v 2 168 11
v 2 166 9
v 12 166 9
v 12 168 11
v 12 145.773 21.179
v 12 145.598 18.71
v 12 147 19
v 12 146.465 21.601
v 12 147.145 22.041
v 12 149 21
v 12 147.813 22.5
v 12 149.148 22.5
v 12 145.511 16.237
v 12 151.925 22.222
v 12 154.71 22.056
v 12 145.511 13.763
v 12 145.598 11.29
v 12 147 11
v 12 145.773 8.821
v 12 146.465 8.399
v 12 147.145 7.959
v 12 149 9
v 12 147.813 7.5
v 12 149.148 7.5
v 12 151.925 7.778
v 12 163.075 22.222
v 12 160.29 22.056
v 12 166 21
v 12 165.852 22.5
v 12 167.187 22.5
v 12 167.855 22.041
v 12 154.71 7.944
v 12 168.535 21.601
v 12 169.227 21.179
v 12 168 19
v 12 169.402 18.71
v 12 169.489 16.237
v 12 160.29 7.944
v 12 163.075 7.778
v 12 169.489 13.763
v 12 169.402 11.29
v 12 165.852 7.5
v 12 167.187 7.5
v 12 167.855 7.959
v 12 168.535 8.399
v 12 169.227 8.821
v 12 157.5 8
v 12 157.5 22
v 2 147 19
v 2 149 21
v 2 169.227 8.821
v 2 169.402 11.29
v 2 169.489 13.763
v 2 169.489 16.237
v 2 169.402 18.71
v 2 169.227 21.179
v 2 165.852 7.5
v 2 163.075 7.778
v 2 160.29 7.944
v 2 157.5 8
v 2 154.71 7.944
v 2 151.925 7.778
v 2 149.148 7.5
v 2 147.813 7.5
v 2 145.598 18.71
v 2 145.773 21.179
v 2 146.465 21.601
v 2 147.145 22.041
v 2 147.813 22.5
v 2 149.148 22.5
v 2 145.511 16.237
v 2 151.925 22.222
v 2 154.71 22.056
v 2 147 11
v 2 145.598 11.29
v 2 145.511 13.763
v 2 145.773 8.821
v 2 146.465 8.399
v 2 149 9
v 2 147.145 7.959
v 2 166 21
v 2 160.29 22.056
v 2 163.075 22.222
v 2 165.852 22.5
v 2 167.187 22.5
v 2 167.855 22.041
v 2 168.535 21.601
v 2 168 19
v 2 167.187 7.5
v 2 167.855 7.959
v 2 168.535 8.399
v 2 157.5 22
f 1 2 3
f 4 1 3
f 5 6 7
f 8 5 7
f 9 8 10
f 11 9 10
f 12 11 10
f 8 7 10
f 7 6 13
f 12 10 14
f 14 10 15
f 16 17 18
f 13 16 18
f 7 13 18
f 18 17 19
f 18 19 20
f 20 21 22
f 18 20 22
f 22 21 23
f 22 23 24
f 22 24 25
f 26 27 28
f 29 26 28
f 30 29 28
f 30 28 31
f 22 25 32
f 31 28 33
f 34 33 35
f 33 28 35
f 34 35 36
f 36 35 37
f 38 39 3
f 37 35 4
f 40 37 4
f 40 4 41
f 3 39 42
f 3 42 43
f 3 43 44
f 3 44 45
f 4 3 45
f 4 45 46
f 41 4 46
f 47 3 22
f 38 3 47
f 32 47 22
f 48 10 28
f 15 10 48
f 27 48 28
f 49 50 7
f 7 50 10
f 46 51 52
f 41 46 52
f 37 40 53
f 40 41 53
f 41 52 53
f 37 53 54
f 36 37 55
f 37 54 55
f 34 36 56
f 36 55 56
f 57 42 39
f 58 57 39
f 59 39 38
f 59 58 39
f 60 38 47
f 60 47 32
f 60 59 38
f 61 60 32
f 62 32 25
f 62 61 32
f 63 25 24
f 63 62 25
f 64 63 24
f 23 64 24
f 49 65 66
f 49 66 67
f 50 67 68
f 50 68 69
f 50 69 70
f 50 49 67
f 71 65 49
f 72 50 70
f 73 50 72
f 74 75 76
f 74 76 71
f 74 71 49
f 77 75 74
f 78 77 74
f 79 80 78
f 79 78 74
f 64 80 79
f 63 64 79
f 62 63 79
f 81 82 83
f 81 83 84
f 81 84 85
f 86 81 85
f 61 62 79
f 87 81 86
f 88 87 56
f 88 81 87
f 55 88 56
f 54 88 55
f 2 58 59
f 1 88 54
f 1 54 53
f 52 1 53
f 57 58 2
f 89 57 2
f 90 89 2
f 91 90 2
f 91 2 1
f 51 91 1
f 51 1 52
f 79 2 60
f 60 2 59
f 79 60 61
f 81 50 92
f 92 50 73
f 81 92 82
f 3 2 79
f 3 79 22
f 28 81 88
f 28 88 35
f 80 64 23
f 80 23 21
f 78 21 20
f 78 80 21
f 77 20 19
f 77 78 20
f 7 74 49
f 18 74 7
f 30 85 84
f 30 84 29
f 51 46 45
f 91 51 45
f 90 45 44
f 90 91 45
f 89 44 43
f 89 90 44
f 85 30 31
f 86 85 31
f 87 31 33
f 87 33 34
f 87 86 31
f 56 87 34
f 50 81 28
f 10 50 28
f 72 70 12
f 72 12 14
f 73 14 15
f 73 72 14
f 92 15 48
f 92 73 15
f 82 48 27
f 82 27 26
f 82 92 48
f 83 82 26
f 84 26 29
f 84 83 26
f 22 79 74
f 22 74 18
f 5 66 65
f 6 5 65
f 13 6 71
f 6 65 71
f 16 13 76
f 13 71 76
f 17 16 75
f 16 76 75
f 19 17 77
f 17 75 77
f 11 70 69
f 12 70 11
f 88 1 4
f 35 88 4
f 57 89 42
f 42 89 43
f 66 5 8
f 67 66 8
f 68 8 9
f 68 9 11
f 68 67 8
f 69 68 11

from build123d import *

# Parameters (mm, degrees)
BOX011_W          = 10
BOX011_H          = 21
BOX011_DEPTH      = 12
CHAMFER001_SIZE   = 2
CYLINDER032_R     = 30
CYLINDER032_DEPTH = 10
CYLINDER031_R     = 30
CYLINDER031_DEPTH = 10
CYLINDER030_R     = 30
CYLINDER030_DEPTH = 10
CYLINDER028_R     = 30
CYLINDER028_DEPTH = 10
CYLINDER029_R     = 70
CYLINDER029_DEPTH = 10
CYLINDER027_R     = 70
CYLINDER027_DEPTH = 10
CYLINDER026_R     = 70
CYLINDER026_DEPTH = 10
CYLINDER025_R     = 70
CYLINDER025_DEPTH = 10
BOX008_W          = 10
BOX008_H          = 24
BOX008_DEPTH      = 15


with BuildPart() as chamfer001:
    # Box011 → Box011 (new body)
    with BuildSketch(Plane(origin=(2, 12, 9), x_dir=(1, 0, 0), z_dir=(0, 0, 1))):
        with Locations((5, 10.5)):
            Rectangle(BOX011_W, BOX011_H)
    extrude(amount=BOX011_DEPTH)

    # Chamfer001
    chamfer001_edges = [chamfer001.edges().sort_by_distance(p)[0] for p in [
        (7, 12, 9),
        (7, 12, 21),
        (7, 33, 9),
        (7, 33, 21),
    ]]
    chamfer(chamfer001_edges, length=CHAMFER001_SIZE)


with BuildPart() as chamfer001_1:
    # Chamfer001 placement: moved
    add(chamfer001.part.moved(Location((0, 135, 0))))


with BuildPart() as cylinder032:
    # Cylinder032 → Cylinder032 (new body)
    with BuildSketch(Plane(origin=(22, -27, 39.5), x_dir=(0, 0, -1), z_dir=(1, 0, 0))):
        Circle(CYLINDER032_R)
    extrude(amount=CYLINDER032_DEPTH)


with BuildPart() as cylinder031:
    # Cylinder031 → Cylinder031 (new body)
    with BuildSketch(Plane(origin=(22, -27, -24.5), x_dir=(0, 0, -1), z_dir=(1, 0, 0))):
        Circle(CYLINDER031_R)
    extrude(amount=CYLINDER031_DEPTH)


with BuildPart() as cylinder030:
    # Cylinder030 → Cylinder030 (new body)
    with BuildSketch(Plane(origin=(22, 27, -24.5), x_dir=(0, 0, -1), z_dir=(1, 0, 0))):
        Circle(CYLINDER030_R)
    extrude(amount=CYLINDER030_DEPTH)


with BuildPart() as cylinder028:
    # Cylinder028 → Cylinder028 (new body)
    with BuildSketch(Plane(origin=(22, 27, 39.5), x_dir=(0, 0, -1), z_dir=(1, 0, 0))):
        Circle(CYLINDER028_R)
    extrude(amount=CYLINDER028_DEPTH)


with BuildPart() as cylinder029:
    # Cylinder029 → Cylinder029 (new body)
    with BuildSketch(Plane(origin=(22, -58, 7.5), x_dir=(0, 0, -1), z_dir=(1, 0, 0))):
        Circle(CYLINDER029_R)
    extrude(amount=CYLINDER029_DEPTH)


with BuildPart() as cylinder027:
    # Cylinder027 → Cylinder027 (new body)
    with BuildSketch(Plane(origin=(22, 58, 7.5), x_dir=(0, 0, -1), z_dir=(1, 0, 0))):
        Circle(CYLINDER027_R)
    extrude(amount=CYLINDER027_DEPTH)


with BuildPart() as cylinder026:
    # Cylinder026 → Cylinder026 (new body)
    with BuildSketch(Plane(origin=(22, 0, 84.5), x_dir=(0, 0, -1), z_dir=(1, 0, 0))):
        Circle(CYLINDER026_R)
    extrude(amount=CYLINDER026_DEPTH)


with BuildPart() as cylinder025:
    # Cylinder025 → Cylinder025 (new body)
    with BuildSketch(Plane(origin=(22, 0, -69.5), x_dir=(0, 0, -1), z_dir=(1, 0, 0))):
        Circle(CYLINDER025_R)
    extrude(amount=CYLINDER025_DEPTH)


with BuildPart() as cut029:
    # Box008 → Box008 (new body)
    with BuildSketch(Plane(origin=(22, -12, 0), x_dir=(1, 0, 0), z_dir=(0, 0, 1))):
        with Locations((5, 12)):
            Rectangle(BOX008_W, BOX008_H)
    extrude(amount=BOX008_DEPTH)

    # Cut015: cut Cylinder025
    add(cylinder025.part, mode=Mode.SUBTRACT)

    # Cut016: cut Cylinder026
    add(cylinder026.part, mode=Mode.SUBTRACT)

    # Common004: intersect Cylinder027
    add(cylinder027.part, mode=Mode.INTERSECT)

    # Common005: intersect Cylinder029
    add(cylinder029.part, mode=Mode.INTERSECT)

    # Cut017: cut Cylinder028
    add(cylinder028.part, mode=Mode.SUBTRACT)

    # Cut018: cut Cylinder030
    add(cylinder030.part, mode=Mode.SUBTRACT)

    # Cut019: cut Cylinder031
    add(cylinder031.part, mode=Mode.SUBTRACT)

    # Cut020: cut Cylinder032
    add(cylinder032.part, mode=Mode.SUBTRACT)


with BuildPart() as cut029_1:
    # Cut020 placement: moved
    add(cut029.part.moved(Location((-20, 157.5, 7.5))))

    # Cut029: cut Chamfer001
    add(chamfer001_1.part, mode=Mode.SUBTRACT)


solid = cut029_1.part
